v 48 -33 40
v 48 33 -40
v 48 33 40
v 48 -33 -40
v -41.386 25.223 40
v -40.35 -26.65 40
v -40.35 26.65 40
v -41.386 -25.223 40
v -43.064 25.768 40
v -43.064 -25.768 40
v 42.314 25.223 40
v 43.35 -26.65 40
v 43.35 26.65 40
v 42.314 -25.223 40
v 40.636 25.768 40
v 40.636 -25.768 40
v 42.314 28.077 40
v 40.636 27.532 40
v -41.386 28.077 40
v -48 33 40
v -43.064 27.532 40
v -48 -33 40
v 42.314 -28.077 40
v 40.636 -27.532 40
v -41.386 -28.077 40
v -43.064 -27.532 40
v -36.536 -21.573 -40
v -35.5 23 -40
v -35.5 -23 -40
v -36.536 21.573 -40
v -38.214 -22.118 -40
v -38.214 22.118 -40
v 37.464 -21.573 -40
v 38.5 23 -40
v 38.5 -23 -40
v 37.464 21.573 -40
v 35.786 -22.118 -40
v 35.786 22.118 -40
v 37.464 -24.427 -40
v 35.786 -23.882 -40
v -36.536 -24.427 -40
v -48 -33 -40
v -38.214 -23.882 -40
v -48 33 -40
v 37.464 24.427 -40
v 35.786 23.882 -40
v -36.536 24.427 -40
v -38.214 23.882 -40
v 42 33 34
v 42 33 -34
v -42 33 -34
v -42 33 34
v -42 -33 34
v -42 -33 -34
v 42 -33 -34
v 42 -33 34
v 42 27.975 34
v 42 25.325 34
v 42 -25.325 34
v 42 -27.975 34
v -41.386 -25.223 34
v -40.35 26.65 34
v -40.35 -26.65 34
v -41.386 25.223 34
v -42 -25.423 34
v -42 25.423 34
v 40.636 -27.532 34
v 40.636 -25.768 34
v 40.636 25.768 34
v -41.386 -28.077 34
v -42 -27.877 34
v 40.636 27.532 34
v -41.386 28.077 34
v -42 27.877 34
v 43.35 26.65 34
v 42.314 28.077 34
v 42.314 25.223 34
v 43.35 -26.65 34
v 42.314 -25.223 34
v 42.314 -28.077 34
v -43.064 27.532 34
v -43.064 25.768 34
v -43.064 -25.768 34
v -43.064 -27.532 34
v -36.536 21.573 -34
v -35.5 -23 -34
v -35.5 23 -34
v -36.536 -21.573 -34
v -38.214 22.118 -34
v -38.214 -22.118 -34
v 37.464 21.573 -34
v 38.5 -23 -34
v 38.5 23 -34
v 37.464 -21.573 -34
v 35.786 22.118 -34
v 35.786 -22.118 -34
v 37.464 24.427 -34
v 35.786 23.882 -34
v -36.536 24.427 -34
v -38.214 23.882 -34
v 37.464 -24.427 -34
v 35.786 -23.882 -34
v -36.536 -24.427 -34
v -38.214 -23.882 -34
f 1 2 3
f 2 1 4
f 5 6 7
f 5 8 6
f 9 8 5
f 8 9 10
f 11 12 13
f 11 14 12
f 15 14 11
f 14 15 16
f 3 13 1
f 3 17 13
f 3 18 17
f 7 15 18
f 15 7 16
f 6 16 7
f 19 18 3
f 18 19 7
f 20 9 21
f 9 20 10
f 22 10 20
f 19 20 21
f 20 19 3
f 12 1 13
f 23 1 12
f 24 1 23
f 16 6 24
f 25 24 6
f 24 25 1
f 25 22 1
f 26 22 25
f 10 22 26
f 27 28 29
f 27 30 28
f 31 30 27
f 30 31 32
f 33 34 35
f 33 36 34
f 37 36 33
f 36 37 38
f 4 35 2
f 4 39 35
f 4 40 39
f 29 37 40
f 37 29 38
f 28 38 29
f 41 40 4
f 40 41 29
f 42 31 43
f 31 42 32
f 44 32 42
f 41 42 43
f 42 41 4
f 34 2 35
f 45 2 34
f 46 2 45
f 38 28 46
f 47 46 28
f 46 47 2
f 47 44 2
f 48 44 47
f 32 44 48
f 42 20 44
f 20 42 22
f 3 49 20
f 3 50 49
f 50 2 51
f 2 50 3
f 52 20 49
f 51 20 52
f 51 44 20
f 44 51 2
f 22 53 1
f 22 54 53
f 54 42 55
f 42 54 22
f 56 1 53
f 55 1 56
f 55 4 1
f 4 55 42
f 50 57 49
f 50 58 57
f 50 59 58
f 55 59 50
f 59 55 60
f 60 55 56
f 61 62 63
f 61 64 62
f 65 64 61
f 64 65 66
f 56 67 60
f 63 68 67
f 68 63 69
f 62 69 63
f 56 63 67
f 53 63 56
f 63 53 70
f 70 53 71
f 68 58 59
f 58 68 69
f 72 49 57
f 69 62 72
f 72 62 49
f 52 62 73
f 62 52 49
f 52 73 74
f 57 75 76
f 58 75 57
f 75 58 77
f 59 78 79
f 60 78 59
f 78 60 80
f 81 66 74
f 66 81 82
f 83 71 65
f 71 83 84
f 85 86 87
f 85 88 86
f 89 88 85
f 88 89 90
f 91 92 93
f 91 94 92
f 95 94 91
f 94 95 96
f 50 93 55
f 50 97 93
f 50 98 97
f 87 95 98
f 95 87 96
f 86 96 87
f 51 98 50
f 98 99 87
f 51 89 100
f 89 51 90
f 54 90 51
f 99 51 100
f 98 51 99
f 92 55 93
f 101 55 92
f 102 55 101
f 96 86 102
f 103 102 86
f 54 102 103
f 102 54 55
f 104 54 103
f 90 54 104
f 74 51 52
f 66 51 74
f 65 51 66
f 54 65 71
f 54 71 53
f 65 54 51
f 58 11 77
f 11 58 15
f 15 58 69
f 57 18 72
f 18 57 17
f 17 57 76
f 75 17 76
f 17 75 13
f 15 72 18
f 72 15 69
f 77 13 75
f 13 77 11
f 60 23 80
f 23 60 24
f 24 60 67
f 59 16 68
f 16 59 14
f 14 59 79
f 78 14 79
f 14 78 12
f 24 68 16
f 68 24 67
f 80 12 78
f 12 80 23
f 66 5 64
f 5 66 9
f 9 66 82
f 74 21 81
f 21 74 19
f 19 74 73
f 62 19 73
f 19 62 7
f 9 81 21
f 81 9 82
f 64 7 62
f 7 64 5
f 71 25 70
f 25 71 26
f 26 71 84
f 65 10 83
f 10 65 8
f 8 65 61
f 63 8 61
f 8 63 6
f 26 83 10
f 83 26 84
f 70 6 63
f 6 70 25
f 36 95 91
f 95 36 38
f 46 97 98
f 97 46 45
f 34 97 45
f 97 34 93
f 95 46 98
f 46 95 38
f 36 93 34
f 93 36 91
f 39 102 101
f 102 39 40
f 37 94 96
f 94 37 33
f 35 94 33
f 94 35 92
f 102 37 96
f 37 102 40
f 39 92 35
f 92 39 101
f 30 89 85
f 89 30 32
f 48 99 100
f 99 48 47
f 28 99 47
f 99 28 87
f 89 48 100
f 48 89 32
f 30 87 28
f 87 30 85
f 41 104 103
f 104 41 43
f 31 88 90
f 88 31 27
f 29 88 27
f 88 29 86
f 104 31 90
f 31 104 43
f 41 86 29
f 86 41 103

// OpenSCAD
pL = 94; //pcb Length
pW = 63.7; //pcb Width

bL = pL + 2; // bracket Length
bW = pW +2.3; //bracket Width
bH = 80; //bracket Height
bT = 6; //bracket Thickness

hDX = 83.7; //hole Distance X
hDY = 53.3; //hole Distance Y
hD = 3; //hole Diameter for M4 standoff
lHDX = 74; //lower Hole Distance X
lHDY = 46; //lower Hole Distance Y

difference (){cube([bL, bW, bH], center = true);
translate([0,0,0]) cube([bL - 2*bT, bW, bH - 2*bT], center = true);
    translate([hDX/2, hDY/2, (bH-bT)/2]) cylinder(h=bT, r=hD/2, center = true);
    translate([hDX/2, -hDY/2, (bH-bT)/2]) cylinder(h=bT, r=hD/2, center = true);
    translate([-hDX/2, hDY/2, (bH-bT)/2]) cylinder(h=bT, r=hD/2, center = true);
    translate([-hDX/2, -hDY/2, (bH-bT)/2]) cylinder(h=bT, r=hD/2, center = true);

    translate([lHDX/2, lHDY/2, -(bH-bT)/2]) cylinder(h=bT, r=hD/2, center = true);
    translate([lHDX/2, -lHDY/2, -(bH-bT)/2]) cylinder(h=bT, r=hD/2, center = true);
    translate([-lHDX/2, lHDY/2, -(bH-bT)/2]) cylinder(h=bT, r=hD/2, center = true);
    translate([-lHDX/2, -lHDY/2, -(bH-bT)/2]) cylinder(h=bT, r=hD/2, center = true);
}
